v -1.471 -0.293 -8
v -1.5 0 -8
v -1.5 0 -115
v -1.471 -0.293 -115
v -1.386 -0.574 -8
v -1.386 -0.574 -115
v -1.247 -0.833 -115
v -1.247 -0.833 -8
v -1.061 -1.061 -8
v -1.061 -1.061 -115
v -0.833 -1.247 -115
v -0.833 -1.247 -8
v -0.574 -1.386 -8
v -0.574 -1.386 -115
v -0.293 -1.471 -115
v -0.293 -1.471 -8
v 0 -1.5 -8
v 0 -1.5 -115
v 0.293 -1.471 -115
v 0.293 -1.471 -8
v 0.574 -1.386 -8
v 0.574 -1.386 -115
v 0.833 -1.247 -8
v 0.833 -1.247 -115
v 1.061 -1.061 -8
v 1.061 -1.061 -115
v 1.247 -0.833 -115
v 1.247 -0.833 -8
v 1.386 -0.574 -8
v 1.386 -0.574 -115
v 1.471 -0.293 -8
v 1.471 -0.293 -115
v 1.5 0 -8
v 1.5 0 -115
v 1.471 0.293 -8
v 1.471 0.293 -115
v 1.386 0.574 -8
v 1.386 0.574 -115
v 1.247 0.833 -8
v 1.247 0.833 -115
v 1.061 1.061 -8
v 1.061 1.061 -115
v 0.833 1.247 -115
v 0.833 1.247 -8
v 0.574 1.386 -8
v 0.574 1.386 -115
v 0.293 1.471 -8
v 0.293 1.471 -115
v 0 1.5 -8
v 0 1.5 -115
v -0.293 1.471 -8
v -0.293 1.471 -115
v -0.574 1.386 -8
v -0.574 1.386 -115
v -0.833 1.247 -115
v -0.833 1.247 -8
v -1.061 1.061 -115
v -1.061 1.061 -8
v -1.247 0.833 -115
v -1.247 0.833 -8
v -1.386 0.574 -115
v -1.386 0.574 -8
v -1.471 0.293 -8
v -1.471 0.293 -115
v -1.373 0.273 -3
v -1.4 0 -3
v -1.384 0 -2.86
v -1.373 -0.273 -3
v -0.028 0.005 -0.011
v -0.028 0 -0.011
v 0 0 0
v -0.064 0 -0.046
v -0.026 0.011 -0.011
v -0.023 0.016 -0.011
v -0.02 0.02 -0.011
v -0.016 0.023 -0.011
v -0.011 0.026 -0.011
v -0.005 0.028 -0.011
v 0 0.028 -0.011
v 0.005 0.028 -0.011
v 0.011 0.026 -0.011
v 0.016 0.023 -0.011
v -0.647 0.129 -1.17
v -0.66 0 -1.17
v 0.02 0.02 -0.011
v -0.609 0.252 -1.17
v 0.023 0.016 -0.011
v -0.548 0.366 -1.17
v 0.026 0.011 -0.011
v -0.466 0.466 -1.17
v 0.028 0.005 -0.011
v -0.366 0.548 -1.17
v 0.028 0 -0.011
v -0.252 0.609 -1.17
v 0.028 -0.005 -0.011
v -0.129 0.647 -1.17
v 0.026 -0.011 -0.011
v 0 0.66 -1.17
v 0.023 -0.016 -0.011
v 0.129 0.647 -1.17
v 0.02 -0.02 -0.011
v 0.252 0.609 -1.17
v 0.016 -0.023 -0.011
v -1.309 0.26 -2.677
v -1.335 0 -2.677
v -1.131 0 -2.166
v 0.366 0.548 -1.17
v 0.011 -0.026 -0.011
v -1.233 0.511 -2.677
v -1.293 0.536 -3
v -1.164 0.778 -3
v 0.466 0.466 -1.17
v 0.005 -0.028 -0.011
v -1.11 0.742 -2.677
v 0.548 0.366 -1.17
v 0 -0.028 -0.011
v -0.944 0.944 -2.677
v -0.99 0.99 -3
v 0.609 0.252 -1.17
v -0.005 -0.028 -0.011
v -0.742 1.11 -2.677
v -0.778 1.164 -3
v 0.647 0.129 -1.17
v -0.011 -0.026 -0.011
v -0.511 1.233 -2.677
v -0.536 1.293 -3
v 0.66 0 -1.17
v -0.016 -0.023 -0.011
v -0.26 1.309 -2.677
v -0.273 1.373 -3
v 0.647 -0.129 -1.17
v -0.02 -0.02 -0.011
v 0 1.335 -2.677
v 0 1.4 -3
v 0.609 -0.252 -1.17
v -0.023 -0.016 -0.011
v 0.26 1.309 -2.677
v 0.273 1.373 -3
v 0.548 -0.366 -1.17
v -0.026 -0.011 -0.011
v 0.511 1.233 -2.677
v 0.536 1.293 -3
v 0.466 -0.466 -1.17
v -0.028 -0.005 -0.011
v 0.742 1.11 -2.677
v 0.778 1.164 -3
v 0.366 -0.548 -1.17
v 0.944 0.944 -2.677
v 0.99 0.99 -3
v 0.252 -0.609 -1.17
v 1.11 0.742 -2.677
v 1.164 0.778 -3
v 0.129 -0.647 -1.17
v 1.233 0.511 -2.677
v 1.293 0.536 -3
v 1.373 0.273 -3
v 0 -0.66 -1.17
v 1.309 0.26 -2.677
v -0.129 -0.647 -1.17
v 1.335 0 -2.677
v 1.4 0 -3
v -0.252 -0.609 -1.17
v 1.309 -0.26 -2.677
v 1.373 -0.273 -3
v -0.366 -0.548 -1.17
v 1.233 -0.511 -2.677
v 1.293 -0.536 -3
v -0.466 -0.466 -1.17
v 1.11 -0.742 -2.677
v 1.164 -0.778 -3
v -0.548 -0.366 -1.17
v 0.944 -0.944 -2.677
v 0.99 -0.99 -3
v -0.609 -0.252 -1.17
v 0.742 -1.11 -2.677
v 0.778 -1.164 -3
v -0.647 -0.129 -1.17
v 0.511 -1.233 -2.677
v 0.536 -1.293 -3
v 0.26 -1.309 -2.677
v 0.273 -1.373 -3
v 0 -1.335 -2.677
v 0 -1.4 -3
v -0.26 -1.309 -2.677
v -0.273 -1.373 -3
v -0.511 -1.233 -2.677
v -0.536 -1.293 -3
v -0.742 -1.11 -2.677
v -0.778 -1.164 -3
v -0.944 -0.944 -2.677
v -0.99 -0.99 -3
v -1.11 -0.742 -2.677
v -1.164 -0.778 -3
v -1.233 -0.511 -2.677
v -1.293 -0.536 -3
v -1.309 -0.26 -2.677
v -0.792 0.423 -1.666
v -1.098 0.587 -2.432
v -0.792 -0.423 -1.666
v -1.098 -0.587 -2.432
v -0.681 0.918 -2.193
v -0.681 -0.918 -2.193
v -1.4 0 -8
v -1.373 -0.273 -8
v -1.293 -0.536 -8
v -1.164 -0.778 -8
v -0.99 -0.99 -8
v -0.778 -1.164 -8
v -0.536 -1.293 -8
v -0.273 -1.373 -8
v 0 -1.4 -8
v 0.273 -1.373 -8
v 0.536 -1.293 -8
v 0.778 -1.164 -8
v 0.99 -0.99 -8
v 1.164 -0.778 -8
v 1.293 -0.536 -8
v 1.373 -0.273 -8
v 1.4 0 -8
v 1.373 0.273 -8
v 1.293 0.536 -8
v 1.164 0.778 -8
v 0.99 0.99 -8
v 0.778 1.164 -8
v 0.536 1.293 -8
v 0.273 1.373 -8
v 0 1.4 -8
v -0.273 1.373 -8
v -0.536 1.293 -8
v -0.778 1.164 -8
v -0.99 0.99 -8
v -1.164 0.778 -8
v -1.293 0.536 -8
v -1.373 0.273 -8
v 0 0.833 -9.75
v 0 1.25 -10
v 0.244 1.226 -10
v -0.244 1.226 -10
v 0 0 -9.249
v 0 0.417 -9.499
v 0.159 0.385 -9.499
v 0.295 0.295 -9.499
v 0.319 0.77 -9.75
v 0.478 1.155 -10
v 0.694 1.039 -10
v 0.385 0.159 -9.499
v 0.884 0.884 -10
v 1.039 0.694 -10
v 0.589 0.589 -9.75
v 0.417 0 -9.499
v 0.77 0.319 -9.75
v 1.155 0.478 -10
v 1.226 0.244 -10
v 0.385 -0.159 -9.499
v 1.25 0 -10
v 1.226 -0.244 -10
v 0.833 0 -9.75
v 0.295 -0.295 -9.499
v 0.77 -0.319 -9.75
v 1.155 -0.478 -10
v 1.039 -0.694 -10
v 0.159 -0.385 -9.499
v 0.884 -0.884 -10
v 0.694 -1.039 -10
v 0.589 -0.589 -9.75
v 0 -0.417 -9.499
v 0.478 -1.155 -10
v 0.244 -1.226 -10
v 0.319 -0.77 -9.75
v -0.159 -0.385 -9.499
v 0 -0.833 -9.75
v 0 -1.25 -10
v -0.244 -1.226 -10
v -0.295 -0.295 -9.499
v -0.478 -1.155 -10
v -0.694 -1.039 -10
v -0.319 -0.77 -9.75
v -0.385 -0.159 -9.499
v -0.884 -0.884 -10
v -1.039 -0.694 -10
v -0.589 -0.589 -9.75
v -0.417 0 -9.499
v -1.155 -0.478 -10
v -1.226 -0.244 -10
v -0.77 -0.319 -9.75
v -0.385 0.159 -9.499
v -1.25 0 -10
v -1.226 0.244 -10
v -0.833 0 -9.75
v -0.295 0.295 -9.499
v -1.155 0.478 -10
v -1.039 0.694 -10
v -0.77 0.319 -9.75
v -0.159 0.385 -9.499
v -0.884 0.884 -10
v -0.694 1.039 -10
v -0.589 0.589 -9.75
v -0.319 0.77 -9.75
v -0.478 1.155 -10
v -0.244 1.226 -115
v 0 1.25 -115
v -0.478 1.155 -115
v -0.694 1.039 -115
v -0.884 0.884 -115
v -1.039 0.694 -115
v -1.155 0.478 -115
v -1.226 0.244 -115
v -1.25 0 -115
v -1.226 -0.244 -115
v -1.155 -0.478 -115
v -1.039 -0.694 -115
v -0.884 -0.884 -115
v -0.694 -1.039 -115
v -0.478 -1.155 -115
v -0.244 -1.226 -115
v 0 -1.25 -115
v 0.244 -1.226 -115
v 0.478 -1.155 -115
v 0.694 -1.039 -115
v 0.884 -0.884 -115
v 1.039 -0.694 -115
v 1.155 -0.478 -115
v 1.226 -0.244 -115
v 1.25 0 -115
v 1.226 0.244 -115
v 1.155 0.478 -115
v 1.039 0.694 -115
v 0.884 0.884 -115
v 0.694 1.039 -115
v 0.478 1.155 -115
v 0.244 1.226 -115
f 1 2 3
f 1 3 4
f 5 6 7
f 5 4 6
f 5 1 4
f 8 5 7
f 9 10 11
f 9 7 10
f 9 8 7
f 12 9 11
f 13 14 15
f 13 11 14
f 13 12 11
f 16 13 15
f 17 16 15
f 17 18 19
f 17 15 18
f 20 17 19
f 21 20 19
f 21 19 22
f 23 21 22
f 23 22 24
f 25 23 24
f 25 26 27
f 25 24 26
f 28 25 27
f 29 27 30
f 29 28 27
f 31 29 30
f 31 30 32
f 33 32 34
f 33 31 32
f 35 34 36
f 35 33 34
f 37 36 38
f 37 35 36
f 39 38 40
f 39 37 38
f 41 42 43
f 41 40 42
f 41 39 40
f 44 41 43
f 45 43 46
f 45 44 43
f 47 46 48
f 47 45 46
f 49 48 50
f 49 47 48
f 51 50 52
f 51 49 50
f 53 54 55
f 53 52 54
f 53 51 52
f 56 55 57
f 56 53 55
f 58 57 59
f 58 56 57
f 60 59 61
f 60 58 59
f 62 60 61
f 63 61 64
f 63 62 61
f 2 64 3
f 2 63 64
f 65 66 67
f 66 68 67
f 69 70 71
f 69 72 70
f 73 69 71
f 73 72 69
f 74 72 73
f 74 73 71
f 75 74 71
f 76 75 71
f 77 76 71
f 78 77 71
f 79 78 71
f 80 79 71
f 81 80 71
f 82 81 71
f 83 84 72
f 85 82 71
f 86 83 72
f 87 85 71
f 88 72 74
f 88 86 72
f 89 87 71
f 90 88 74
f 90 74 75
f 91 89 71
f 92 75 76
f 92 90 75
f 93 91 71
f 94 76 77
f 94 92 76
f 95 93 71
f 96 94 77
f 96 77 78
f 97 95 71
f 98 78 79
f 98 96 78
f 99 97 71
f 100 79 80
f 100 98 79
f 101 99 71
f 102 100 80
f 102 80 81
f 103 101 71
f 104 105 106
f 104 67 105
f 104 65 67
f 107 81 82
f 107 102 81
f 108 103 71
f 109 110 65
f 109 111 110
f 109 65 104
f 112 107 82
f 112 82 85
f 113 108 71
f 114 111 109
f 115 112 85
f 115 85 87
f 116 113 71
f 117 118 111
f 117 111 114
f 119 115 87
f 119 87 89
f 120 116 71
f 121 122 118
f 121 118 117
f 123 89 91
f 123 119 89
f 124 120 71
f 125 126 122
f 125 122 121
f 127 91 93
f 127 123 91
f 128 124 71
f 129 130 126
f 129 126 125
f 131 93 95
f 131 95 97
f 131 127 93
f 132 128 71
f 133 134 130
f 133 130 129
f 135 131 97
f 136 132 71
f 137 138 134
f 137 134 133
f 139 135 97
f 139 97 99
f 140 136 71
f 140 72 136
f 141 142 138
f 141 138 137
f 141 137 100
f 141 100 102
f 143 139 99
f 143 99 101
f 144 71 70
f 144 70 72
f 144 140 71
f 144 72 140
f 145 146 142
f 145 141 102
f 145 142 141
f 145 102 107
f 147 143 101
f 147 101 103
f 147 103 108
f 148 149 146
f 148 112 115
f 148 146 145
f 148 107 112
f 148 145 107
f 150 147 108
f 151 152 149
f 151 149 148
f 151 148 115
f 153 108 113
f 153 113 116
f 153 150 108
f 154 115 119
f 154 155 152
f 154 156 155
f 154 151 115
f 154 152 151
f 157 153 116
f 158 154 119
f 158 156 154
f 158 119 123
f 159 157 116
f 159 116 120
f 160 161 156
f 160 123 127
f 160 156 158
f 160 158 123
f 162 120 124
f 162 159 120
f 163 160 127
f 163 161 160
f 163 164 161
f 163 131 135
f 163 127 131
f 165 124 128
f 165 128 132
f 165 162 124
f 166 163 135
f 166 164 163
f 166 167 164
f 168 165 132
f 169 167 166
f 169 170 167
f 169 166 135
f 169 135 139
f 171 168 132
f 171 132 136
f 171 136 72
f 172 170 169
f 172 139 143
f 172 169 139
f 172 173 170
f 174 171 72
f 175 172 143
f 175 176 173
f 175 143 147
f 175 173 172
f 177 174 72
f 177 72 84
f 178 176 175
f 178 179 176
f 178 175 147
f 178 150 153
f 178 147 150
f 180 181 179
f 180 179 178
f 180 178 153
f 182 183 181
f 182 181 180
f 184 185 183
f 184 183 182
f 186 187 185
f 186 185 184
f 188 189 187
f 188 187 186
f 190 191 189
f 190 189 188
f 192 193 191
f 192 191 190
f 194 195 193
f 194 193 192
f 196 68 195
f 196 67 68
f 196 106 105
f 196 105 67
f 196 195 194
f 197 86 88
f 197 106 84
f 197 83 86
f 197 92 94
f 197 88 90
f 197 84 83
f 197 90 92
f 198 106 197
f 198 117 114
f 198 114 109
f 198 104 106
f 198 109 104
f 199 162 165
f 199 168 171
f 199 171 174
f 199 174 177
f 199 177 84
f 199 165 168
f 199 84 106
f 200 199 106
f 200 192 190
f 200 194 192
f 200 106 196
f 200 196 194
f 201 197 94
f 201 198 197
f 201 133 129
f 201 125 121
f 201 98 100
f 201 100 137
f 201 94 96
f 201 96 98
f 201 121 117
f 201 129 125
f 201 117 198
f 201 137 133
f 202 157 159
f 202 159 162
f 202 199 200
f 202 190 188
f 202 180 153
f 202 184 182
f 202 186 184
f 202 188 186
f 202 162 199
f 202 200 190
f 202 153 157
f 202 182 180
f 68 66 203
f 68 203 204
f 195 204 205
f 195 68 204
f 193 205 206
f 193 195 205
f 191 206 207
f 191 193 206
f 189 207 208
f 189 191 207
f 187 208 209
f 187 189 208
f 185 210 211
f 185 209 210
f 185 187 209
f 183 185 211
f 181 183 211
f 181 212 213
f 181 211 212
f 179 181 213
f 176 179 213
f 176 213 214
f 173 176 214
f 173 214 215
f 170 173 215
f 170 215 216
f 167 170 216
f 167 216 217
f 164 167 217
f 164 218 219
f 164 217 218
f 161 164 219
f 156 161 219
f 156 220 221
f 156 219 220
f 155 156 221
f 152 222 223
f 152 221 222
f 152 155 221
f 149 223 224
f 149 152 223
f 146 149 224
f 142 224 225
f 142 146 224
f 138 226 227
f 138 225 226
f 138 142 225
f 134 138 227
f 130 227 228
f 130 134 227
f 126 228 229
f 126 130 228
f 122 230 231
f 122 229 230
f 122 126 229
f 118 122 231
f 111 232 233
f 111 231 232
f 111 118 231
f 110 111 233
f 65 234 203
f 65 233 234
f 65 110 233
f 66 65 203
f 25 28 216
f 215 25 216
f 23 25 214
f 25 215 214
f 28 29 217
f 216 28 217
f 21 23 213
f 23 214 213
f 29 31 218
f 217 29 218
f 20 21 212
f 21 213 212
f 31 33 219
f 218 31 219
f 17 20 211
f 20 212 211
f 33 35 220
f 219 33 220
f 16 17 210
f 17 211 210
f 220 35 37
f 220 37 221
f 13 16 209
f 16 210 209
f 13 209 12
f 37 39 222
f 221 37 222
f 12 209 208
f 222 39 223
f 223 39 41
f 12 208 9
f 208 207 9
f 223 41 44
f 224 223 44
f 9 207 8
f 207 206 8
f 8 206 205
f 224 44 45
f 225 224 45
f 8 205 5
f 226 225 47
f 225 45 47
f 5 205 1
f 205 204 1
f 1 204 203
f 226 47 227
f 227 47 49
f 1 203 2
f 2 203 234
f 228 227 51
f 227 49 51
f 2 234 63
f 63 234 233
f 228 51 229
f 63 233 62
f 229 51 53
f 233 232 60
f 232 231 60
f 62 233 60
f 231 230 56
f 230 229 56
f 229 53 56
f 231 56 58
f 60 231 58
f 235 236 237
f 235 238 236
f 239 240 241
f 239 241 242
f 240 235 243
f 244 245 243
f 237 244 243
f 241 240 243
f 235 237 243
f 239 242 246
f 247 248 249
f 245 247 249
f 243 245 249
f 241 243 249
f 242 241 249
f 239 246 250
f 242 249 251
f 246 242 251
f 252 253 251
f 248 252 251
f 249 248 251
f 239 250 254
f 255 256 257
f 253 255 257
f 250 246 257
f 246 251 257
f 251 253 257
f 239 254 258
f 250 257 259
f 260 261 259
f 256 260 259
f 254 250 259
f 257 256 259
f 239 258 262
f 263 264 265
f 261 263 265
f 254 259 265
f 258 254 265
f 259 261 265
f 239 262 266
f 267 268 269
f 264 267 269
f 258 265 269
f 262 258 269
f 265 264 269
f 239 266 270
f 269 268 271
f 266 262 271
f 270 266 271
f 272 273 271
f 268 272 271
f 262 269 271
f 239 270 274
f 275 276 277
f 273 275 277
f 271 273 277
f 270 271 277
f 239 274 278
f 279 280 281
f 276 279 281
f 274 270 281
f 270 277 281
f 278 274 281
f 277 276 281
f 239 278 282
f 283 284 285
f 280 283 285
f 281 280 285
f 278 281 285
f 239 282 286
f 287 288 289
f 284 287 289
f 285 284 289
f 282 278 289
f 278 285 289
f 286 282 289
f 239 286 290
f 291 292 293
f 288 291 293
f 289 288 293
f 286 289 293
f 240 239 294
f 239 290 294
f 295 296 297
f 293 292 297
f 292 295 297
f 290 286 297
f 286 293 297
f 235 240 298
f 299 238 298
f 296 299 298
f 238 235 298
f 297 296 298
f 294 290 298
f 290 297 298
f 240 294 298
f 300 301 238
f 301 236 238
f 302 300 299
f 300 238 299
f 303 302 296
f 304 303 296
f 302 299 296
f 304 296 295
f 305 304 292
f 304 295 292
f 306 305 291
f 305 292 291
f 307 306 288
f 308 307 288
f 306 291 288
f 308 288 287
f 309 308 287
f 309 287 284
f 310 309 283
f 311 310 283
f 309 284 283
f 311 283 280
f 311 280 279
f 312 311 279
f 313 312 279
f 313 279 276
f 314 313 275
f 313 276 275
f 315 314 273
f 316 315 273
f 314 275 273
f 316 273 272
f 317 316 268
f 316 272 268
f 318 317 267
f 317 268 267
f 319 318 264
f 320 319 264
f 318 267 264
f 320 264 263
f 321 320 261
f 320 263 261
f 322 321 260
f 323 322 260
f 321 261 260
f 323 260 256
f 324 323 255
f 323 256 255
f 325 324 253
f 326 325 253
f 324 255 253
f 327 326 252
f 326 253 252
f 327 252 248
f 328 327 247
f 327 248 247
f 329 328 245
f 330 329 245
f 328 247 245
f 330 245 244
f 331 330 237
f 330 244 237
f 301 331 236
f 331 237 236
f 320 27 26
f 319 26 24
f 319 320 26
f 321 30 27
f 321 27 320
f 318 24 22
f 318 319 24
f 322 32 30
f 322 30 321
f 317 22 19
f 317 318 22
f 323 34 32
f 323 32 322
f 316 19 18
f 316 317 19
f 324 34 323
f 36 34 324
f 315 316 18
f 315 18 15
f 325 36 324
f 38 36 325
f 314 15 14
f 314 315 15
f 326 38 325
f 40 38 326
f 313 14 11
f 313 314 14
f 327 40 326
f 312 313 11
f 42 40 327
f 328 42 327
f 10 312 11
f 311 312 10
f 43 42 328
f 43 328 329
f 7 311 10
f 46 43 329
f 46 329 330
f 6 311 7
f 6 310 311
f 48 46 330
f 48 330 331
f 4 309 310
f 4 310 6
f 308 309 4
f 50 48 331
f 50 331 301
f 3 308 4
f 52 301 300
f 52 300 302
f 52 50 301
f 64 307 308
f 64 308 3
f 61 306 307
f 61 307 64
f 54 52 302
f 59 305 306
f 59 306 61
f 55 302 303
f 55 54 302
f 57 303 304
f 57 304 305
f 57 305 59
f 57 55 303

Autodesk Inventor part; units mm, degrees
ref_plane "YZ Plane" through (0, 0, 0) normal (1, 0, 0) x (0, 1, 0)
ref_plane "XZ Plane" through (0, 0, 0) normal (0, 1, 0) x (-1, 0, 0)
ref_plane "XY Plane" through (0, 0, 0) normal (0, 0, 1) x (1, 0, 0)
sketch "草圖1" plane through (0, 0, 0) normal (0, 1, 0) x (-1, 0, 0)
  line L0 (0, 0) -> (0, -115)
  line L1 (0, -115) -> (1.5, -115)
  line L2 (1.5, -115) -> (1.5, -8)
  line L3 (1.5, -8) -> (1.5, -8.1)
  line L4 (1.5, -8) -> (1.4, -8)
  line L5 (1.4, -8) -> (1.4, -3)
  line L6 (0, 0) -> (0.0831, 0) construction
  line L7 (0.0831, 0) -> (0.4369, -0.6984) construction
  line L8 (0.4369, -0.6984) -> (0.929, -1.7279) construction
  line L9 (0.929, -1.7279) -> (1.4, -2.7133) construction
  line L10 (1.4, -2.7133) -> (1.4, -3) construction
  spline S0 degree 4 poles (0, 0) (0.0831, 0) (0.4369, -0.6984) (0.929, -1.7279) (1.4, -2.7133) (1.4, -3) knots 0 0 0 0 0 1 2 2 2 2 2
  line L11 (1.5, -8) -> (1.5, -21)
  arc A0 (1.5836, -22.9983) -> (1.5, -21) centre (1.5558, -21.9985) ccw
  dimension "d0" = 115
  dimension "d1" = 1.5
  dimension "d2" = 107
  dimension "d4" = 0.1
  dimension "d5" = 5
  dimension "d8" = 13
  dimension "d9" = 2
  dimension "d10" = 1.0001
revolve "迴轉1" add sketch "草圖1" angle 360 about axis through (0, 0, 0) along (0, 0, -1)
sketch "草圖2" plane through (0, 0, -115) normal (0, 0, -1) x (-1, 0, 0)
  point P0 (0, 0)
  point P1 (0, 0)
hole "孔1" at (0, 0, -115) direction (0, 0, 1) diameter 2.5 depth 105 tip angle 118
properties part number "筆芯"
